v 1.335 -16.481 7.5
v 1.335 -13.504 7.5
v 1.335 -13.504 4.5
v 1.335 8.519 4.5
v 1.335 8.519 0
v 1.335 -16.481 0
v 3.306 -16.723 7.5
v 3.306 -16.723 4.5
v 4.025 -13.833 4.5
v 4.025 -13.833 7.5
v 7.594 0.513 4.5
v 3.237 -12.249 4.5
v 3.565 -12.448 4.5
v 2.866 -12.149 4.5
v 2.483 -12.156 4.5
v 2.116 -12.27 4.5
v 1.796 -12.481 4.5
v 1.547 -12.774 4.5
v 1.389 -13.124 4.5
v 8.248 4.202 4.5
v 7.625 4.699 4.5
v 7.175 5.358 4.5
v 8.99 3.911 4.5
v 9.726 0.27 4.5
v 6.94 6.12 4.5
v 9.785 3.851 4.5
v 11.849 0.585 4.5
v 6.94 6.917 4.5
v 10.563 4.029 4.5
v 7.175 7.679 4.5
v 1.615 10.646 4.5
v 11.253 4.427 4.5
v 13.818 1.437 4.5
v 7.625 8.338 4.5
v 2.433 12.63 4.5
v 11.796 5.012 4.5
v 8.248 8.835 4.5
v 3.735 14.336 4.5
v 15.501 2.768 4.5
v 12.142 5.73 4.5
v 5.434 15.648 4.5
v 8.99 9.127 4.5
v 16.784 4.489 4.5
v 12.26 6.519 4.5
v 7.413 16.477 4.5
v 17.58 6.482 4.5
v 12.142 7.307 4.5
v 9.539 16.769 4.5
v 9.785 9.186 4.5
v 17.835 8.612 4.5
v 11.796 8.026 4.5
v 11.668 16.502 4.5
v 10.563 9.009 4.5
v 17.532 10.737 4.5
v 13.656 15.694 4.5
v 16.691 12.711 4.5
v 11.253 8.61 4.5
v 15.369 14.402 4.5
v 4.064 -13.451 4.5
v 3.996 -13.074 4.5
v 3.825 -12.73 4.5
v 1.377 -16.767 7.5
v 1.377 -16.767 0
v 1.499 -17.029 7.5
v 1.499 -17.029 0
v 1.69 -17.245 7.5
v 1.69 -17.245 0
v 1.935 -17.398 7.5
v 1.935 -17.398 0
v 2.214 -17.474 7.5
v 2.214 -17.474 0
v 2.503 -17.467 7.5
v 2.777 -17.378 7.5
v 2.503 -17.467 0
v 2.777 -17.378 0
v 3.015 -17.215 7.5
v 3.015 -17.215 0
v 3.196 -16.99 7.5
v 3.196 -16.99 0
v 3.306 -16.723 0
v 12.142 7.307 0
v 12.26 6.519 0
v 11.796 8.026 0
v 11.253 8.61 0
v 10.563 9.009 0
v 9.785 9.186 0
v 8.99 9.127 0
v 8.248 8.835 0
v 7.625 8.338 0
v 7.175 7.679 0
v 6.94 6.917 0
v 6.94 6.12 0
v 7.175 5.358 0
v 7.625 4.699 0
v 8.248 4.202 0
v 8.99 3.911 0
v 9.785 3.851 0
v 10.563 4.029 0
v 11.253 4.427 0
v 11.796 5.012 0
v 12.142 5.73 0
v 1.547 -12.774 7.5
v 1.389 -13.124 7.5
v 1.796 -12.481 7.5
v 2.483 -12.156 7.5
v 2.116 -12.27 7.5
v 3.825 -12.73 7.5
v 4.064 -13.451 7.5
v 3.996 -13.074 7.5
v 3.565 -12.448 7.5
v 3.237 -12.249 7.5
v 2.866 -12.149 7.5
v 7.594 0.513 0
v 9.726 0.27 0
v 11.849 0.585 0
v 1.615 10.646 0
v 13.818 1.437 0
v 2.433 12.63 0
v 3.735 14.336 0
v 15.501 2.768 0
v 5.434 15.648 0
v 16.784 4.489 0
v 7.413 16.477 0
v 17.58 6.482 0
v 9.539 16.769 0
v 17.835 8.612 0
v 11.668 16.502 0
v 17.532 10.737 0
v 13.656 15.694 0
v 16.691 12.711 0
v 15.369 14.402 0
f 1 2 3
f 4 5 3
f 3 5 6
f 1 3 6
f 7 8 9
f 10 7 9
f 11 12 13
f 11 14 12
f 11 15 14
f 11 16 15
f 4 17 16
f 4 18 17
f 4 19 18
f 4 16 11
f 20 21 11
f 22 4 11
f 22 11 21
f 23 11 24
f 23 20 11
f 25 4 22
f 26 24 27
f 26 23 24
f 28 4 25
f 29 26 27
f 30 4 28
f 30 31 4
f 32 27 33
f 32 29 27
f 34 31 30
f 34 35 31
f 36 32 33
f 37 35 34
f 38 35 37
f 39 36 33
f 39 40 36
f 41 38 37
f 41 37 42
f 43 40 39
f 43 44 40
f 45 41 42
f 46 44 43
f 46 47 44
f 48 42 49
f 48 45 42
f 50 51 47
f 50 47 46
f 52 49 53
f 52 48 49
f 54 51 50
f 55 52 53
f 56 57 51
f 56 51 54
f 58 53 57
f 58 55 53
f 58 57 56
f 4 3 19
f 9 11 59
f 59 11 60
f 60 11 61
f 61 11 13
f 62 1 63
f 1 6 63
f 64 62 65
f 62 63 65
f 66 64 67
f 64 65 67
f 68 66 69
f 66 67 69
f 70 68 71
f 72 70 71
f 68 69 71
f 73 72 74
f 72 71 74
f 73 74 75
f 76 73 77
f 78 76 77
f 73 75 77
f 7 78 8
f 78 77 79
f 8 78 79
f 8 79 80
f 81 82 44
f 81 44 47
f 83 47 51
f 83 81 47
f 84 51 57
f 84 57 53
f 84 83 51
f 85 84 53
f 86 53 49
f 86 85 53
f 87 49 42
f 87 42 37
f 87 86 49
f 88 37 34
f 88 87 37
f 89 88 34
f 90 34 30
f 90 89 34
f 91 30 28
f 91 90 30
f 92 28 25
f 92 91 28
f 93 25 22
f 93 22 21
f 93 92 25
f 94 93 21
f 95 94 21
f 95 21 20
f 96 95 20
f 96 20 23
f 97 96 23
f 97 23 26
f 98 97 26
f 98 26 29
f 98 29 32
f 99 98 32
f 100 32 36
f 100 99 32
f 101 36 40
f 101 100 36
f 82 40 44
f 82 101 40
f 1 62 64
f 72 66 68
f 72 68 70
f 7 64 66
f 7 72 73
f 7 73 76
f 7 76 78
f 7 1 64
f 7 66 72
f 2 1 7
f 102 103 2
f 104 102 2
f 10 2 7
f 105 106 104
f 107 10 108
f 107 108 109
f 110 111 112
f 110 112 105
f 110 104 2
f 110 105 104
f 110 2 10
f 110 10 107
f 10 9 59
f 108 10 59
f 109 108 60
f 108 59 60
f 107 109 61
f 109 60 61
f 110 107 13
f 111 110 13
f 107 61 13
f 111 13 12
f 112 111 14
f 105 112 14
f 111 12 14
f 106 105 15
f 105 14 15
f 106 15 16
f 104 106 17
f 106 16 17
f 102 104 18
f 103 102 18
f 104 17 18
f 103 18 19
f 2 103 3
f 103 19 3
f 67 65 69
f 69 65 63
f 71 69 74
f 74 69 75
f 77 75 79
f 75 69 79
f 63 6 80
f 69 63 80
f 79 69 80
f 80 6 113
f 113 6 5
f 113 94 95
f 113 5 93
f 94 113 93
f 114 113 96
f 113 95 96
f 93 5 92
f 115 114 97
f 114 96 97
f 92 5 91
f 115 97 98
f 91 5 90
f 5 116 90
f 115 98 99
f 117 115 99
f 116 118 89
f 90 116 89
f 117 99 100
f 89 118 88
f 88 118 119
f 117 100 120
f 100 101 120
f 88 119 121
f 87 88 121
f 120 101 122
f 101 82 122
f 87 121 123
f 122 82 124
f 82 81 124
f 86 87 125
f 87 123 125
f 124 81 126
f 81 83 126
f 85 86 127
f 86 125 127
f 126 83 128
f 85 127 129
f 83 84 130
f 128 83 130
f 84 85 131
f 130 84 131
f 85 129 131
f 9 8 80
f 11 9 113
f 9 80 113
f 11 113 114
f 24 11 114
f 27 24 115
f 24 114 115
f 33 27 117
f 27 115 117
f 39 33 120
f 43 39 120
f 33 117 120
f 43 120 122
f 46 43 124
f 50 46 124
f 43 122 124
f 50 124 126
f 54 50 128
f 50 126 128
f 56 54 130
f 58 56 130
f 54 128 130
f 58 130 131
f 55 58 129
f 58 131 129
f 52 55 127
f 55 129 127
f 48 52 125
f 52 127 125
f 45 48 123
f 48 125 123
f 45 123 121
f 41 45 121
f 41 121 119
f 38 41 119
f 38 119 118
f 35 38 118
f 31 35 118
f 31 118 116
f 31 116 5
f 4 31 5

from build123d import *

# Parameters (mm, degrees)
SKETCH1_R           = 2.675
BOSS_EXTRUDE1_DEPTH = 4.5
BOSS_EXTRUDE2_DEPTH = 3


with BuildPart() as part:
    # Sketch1 → Boss-Extrude1 (new body)
    with BuildSketch(Plane.XY):
        with BuildLine():
            Line((1.335499014, 8.518725494), (1.335499014, -16.481274506))
            ThreePointArc((1.335499014, -16.481274506), (2.213885401, -17.473852024), (3.305919272, -16.722696381))
            Line((3.305919272, -16.722696381), (7.593768545, 0.512758361))
            ThreePointArc((7.593768545, 0.512758361), (16.08527887, 13.599607486), (1.335499014, 8.518725494))
        make_face()
        with Locations((9.585499014, 6.518725494)):
            Circle(SKETCH1_R, mode=Mode.SUBTRACT)
    extrude(amount=BOSS_EXTRUDE1_DEPTH)

    # Sketch2 → Boss-Extrude2 (add)
    with BuildSketch(Plane.XY.offset(4.5)):
        with BuildLine():
            Line((1.335499014, -13.503541952), (1.335499014, -16.481274506))
            ThreePointArc((1.335499014, -16.481274506), (2.213885401, -17.473852024), (3.305919272, -16.722696381))
            Line((3.305919272, -16.722696381), (4.024809049, -13.833044386))
            ThreePointArc((4.024809049, -13.833044386), (2.866323075, -12.148831621), (1.335499014, -13.503541952))
        make_face()
    extrude(amount=BOSS_EXTRUDE2_DEPTH)


solid = part.part
